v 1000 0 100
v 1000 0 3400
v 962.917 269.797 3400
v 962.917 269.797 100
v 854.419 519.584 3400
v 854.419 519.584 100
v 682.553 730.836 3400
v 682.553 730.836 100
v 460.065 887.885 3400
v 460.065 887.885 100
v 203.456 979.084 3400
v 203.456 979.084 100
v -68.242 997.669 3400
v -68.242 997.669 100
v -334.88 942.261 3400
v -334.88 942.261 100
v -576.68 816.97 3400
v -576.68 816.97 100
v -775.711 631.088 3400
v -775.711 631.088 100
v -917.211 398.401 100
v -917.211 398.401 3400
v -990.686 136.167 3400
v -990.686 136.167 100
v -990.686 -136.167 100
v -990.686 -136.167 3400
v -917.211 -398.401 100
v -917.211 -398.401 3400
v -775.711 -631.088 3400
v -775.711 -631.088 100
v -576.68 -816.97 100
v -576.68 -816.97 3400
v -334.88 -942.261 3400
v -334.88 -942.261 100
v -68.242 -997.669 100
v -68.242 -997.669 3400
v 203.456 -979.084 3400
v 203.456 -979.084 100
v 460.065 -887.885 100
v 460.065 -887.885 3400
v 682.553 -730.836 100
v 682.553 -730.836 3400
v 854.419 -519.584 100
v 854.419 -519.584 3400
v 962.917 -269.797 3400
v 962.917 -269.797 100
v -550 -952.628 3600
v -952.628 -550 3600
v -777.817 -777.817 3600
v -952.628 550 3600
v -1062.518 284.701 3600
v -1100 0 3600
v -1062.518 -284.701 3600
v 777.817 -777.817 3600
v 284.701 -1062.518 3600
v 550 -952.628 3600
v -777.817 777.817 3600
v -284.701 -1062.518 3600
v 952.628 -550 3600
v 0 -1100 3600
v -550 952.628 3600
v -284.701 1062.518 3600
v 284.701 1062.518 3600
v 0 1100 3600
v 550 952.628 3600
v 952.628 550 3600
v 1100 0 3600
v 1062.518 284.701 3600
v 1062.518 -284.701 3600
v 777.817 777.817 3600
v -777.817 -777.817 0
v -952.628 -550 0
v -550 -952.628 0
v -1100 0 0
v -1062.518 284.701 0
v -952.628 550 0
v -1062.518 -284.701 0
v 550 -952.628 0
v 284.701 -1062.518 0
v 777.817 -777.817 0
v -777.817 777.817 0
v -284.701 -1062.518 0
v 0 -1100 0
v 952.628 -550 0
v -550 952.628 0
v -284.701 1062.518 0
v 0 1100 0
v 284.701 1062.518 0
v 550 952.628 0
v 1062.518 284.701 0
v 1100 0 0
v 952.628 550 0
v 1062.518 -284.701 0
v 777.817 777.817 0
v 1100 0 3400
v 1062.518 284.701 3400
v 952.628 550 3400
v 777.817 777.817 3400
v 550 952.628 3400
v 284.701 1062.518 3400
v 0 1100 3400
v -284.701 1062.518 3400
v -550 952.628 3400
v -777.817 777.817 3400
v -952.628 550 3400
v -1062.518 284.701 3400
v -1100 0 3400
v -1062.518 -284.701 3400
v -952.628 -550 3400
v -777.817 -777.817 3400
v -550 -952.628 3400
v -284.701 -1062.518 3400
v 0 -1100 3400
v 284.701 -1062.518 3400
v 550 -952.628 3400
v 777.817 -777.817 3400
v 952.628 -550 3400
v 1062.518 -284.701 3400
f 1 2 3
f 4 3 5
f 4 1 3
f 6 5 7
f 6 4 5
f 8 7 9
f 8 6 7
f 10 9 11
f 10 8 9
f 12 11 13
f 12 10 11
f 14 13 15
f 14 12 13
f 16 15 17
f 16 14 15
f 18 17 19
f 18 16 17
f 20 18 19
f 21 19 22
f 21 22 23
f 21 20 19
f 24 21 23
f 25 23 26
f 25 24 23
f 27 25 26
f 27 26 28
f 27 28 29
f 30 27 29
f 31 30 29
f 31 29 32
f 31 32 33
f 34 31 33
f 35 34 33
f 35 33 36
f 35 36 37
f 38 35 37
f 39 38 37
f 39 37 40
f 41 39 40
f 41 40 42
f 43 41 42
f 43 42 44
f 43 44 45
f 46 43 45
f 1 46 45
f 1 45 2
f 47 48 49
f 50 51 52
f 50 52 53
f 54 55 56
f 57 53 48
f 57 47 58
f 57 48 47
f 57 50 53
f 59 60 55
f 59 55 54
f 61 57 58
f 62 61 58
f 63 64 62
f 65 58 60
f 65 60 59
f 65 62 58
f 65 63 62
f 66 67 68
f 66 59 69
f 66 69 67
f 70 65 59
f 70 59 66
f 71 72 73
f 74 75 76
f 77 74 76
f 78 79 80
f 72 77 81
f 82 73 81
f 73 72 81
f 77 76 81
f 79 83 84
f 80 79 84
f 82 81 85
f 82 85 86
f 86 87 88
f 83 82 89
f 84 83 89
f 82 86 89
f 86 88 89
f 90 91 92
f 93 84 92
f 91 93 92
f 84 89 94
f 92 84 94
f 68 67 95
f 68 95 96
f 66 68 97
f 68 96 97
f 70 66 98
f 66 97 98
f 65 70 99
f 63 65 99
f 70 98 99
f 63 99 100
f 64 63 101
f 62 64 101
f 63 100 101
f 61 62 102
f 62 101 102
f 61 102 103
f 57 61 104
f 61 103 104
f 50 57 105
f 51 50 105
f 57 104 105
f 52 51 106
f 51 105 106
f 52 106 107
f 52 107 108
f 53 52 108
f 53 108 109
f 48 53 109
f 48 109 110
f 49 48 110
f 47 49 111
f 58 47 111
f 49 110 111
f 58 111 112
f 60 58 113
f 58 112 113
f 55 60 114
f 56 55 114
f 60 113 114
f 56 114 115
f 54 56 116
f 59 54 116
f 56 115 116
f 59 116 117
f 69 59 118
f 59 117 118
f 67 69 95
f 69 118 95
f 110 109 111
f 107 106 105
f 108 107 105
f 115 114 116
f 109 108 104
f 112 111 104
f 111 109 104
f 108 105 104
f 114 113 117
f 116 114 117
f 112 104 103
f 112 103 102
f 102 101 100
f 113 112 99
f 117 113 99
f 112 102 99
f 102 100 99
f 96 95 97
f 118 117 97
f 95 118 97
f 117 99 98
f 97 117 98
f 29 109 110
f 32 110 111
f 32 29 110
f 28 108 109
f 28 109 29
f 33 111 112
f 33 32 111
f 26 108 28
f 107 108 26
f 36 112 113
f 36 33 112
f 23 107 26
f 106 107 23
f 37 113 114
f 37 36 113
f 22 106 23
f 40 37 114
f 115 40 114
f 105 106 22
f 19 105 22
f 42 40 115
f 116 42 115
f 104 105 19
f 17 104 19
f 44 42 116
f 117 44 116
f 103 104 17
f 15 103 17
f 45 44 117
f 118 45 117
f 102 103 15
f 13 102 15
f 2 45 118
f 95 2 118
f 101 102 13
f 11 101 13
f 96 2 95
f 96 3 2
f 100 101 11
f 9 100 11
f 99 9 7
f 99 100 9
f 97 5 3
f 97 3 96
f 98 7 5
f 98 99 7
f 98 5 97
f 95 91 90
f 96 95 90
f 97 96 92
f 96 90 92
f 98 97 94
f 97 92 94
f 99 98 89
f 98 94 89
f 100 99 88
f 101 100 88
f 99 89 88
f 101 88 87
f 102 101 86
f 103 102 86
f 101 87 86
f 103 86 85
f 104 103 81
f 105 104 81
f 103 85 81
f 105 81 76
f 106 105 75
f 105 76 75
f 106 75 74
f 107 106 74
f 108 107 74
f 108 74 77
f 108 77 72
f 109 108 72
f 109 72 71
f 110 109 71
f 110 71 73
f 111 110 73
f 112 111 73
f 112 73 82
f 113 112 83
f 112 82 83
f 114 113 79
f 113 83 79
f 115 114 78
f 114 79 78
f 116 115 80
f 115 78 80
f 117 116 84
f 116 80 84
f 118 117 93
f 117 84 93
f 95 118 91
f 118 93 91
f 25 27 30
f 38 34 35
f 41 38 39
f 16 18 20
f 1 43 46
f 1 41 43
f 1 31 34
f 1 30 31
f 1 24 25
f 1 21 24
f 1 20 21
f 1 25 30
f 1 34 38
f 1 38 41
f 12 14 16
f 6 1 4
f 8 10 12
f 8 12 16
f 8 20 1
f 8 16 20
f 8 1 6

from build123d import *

# Parameters (mm, degrees)
F0_R     = 1100
F1_DEPTH = 3400
F2_T     = -100
F3_R     = 1100
F4_DEPTH = 200


with BuildPart() as f1:
    # F0 (on Top) → F1 (new body)
    with BuildSketch(Plane.XY):
        Circle(F0_R)
    extrude(amount=F1_DEPTH)

    # F2
    f2_openings = [f1.faces().sort_by_distance(p)[0] for p in [
        (0, 0, 3400),
    ]]
    offset(amount=F2_T, openings=f2_openings)


with BuildPart() as f4:
    # F3 (on face) → F4 (new body)
    with BuildSketch(Plane.XY.offset(3400)):
        Circle(F3_R)
    extrude(amount=F4_DEPTH)


solid = Compound([f1.part, f4.part])
